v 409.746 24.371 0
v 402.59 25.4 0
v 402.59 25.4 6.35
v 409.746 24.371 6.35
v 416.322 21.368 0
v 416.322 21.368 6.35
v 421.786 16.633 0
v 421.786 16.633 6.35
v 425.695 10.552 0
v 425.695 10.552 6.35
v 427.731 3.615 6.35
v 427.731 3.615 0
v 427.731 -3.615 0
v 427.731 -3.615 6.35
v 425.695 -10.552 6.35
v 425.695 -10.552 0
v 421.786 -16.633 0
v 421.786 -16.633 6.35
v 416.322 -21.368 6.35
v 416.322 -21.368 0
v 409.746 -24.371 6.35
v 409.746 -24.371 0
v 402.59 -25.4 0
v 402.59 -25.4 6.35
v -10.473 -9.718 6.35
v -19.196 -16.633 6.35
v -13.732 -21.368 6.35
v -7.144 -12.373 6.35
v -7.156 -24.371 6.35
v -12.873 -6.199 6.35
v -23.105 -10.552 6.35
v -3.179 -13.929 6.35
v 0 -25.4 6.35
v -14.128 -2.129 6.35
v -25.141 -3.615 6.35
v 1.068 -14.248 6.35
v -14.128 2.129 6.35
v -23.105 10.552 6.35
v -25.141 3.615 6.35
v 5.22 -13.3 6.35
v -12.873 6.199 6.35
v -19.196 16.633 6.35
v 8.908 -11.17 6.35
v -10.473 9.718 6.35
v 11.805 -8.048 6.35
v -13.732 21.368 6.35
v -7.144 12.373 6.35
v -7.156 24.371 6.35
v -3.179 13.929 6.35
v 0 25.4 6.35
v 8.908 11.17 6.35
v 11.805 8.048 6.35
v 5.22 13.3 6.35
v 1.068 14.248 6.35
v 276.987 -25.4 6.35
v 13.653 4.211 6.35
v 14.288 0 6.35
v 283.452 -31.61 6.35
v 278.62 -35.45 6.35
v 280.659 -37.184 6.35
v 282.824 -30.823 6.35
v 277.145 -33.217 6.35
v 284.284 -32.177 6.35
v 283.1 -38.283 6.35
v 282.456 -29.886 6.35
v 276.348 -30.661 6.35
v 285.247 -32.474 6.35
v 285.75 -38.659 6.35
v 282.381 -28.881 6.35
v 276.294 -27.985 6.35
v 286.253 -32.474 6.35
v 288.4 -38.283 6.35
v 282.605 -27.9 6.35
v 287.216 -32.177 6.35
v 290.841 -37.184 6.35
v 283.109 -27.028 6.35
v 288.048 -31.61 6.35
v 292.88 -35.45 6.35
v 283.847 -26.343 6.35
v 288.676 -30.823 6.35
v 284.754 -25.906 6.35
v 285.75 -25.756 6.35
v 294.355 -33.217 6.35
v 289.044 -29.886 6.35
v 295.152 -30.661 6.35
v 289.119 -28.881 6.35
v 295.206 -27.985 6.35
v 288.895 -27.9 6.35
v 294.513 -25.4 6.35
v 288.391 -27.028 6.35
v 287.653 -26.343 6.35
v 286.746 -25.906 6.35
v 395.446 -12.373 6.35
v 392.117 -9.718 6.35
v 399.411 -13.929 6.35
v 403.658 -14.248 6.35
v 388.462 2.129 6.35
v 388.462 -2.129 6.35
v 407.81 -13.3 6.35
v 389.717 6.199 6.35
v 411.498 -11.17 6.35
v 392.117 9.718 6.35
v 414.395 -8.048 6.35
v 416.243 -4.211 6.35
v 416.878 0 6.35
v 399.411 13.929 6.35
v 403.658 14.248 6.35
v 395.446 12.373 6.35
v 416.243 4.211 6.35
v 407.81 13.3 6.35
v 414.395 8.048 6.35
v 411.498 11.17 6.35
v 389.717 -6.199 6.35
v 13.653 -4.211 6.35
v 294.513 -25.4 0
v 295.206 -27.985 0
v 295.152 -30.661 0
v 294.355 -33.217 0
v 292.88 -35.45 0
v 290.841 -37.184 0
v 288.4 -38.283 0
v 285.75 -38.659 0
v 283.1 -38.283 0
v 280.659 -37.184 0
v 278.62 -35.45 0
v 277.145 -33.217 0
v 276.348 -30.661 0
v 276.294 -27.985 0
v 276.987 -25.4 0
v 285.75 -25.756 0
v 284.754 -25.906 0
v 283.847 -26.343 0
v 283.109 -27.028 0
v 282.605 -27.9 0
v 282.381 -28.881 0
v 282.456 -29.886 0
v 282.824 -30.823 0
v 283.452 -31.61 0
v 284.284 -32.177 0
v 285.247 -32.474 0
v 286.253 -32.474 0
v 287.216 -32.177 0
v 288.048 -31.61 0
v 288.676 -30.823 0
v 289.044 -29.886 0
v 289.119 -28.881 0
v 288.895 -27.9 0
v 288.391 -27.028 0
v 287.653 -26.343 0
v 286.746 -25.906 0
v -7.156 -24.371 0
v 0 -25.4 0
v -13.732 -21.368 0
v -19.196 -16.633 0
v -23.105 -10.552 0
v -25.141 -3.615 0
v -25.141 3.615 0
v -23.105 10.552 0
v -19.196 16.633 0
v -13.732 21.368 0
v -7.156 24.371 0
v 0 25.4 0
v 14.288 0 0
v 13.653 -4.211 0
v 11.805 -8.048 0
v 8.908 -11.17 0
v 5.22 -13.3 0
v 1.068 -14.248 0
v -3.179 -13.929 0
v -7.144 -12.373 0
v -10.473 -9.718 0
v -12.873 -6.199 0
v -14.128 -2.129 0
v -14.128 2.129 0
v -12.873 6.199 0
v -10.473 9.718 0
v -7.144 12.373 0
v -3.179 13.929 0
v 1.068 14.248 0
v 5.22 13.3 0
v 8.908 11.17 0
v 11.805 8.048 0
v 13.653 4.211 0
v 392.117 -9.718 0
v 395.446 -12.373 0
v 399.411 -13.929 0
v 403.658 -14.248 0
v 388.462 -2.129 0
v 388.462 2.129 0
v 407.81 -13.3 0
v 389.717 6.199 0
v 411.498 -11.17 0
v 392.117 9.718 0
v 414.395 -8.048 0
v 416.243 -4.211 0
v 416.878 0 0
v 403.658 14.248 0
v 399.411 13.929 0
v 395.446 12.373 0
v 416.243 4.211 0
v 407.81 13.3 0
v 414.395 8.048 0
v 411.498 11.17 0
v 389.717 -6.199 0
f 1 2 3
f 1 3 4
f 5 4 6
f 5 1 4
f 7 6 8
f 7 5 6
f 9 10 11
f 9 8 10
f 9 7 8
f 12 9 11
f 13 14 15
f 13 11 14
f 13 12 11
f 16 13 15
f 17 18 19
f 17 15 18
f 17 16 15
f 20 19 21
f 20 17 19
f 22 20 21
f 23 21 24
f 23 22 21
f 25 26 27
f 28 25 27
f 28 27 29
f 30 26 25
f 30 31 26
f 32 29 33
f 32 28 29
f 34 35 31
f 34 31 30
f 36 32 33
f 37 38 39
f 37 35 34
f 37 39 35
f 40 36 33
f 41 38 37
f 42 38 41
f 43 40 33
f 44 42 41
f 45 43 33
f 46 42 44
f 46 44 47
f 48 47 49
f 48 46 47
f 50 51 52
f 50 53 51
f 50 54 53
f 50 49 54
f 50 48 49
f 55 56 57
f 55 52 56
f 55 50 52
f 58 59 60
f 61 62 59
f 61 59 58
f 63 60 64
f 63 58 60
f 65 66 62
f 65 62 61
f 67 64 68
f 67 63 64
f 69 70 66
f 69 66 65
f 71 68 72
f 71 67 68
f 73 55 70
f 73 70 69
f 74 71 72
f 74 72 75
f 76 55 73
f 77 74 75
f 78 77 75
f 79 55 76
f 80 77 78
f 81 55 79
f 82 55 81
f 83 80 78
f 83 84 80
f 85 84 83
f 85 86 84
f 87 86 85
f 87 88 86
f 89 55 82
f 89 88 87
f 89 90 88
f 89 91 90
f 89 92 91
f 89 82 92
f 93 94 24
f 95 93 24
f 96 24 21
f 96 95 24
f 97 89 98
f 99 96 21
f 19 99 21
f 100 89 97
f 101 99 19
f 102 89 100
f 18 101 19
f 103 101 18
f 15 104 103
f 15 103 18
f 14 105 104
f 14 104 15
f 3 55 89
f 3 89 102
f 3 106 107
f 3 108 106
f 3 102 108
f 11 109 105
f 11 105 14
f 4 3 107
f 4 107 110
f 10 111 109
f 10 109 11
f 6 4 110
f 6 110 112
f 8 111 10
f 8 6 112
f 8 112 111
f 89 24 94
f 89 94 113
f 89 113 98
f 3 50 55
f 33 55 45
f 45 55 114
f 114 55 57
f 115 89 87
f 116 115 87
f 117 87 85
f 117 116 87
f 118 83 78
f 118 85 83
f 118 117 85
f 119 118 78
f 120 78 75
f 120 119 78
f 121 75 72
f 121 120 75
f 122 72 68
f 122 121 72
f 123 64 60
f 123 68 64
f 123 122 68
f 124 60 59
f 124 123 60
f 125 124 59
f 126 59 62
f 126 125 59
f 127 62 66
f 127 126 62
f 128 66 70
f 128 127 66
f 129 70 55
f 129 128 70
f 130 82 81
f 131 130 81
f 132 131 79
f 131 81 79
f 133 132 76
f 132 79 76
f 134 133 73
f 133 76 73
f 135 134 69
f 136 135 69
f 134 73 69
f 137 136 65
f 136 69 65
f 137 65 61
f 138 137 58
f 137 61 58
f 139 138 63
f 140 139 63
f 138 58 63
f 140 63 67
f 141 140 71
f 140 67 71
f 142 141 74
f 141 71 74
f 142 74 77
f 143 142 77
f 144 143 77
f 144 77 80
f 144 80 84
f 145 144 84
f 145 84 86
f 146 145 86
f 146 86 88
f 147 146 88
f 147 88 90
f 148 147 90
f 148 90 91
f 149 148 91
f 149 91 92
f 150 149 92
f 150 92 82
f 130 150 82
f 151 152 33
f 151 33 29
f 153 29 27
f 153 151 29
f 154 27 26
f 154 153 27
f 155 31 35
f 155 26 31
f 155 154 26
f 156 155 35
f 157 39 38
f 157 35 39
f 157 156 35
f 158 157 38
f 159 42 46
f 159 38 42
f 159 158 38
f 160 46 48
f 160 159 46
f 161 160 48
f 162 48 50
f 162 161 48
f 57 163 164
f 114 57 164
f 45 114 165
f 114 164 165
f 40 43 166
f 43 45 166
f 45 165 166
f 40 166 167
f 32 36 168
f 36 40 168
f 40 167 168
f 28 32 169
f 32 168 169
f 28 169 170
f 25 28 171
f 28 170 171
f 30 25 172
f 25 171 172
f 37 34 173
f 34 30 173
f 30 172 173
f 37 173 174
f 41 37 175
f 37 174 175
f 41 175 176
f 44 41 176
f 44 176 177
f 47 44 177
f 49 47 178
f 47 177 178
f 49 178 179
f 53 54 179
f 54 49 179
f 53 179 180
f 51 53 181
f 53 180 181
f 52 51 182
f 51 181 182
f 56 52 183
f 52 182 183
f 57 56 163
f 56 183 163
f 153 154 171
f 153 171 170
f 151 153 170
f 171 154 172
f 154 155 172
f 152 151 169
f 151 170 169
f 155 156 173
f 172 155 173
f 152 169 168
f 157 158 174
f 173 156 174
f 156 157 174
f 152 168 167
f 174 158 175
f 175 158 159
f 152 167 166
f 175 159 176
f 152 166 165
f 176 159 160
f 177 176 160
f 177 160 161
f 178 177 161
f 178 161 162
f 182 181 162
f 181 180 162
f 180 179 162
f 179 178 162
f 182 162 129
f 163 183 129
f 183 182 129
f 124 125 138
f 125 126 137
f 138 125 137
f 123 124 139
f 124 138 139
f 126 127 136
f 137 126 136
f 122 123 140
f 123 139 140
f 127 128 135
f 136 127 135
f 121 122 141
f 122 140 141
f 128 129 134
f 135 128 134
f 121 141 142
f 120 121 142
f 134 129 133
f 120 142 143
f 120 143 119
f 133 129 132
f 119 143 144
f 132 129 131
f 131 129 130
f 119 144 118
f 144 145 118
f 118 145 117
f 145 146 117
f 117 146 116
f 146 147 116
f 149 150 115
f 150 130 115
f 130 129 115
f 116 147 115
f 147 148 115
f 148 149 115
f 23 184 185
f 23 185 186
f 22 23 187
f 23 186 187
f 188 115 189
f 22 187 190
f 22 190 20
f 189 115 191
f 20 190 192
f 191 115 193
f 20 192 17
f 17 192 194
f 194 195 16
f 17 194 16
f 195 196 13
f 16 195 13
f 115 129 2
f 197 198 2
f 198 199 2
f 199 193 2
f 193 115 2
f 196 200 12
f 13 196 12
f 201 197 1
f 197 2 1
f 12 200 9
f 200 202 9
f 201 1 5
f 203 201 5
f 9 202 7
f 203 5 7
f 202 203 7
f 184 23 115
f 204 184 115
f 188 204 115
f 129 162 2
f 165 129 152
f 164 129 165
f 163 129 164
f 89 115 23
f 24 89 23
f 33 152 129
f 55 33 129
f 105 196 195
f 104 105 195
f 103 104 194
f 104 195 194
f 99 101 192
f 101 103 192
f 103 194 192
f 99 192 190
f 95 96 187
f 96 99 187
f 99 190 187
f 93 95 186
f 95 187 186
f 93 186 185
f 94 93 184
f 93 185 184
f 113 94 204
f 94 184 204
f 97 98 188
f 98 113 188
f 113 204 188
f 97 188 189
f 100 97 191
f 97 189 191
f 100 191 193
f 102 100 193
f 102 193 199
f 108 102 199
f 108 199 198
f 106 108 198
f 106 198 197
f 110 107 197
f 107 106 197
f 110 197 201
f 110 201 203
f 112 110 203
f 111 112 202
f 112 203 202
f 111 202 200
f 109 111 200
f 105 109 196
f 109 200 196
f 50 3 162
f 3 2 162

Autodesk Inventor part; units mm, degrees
ref_plane "YZ Plane" through (0, 0, 0) normal (1, 0, 0) x (0, 1, 0)
ref_plane "XZ Plane" through (0, 0, 0) normal (0, 1, 0) x (-1, 0, 0)
ref_plane "XY Plane" through (0, 0, 0) normal (0, 0, 1) x (1, 0, 0)
sketch "Sketch1" plane through (0, 0, 0) normal (0, 0, 1) x (1, 0, 0)
  circle A0 centre (0, 0) radius 14.2875
  circle A1 centre (402.59, 0) radius 14.2875
  line L0 (0, 0) -> (402.59, 0) construction
  line L1 (0, 0) -> (402.59, 0) construction
  line L2 (402.59, 25.4) -> (0, 25.4)
  arc A2 (0, 25.4) -> (0, -25.4) centre (0, 0) ccw
  arc A3 (402.59, -25.4) -> (402.59, 25.4) centre (402.59, 0) ccw
  arc A4 (276.9873, -25.4) -> (294.5127, -25.4) centre (285.75, -29.1338) ccw
  line L3 (0, -25.4) -> (276.9873, -25.4)
  line L4 (294.5127, -25.4) -> (402.59, -25.4)
  point P0 (201.295, 0)
  dimension "d0" = 28.575
  dimension "d1" = 402.59
  dimension "d2" = 50.8
  dimension "d3" = 285.75
  dimension "d15" = 29.1338
  dimension "d16" = 19.05
extrude "Extrusion1" add sketch "Sketch1" along normal blind 6.35
hole "Hole1" at (285.75, -29.1338, 0) direction (0, 0, 1) diameter 6.7564 end through all clearance for "Flat Head Machine Screw (82)" size "1/4" standard "Ansi Unified Screw Threads"
properties part number "GP4-003" material "Aluminum 6061"
